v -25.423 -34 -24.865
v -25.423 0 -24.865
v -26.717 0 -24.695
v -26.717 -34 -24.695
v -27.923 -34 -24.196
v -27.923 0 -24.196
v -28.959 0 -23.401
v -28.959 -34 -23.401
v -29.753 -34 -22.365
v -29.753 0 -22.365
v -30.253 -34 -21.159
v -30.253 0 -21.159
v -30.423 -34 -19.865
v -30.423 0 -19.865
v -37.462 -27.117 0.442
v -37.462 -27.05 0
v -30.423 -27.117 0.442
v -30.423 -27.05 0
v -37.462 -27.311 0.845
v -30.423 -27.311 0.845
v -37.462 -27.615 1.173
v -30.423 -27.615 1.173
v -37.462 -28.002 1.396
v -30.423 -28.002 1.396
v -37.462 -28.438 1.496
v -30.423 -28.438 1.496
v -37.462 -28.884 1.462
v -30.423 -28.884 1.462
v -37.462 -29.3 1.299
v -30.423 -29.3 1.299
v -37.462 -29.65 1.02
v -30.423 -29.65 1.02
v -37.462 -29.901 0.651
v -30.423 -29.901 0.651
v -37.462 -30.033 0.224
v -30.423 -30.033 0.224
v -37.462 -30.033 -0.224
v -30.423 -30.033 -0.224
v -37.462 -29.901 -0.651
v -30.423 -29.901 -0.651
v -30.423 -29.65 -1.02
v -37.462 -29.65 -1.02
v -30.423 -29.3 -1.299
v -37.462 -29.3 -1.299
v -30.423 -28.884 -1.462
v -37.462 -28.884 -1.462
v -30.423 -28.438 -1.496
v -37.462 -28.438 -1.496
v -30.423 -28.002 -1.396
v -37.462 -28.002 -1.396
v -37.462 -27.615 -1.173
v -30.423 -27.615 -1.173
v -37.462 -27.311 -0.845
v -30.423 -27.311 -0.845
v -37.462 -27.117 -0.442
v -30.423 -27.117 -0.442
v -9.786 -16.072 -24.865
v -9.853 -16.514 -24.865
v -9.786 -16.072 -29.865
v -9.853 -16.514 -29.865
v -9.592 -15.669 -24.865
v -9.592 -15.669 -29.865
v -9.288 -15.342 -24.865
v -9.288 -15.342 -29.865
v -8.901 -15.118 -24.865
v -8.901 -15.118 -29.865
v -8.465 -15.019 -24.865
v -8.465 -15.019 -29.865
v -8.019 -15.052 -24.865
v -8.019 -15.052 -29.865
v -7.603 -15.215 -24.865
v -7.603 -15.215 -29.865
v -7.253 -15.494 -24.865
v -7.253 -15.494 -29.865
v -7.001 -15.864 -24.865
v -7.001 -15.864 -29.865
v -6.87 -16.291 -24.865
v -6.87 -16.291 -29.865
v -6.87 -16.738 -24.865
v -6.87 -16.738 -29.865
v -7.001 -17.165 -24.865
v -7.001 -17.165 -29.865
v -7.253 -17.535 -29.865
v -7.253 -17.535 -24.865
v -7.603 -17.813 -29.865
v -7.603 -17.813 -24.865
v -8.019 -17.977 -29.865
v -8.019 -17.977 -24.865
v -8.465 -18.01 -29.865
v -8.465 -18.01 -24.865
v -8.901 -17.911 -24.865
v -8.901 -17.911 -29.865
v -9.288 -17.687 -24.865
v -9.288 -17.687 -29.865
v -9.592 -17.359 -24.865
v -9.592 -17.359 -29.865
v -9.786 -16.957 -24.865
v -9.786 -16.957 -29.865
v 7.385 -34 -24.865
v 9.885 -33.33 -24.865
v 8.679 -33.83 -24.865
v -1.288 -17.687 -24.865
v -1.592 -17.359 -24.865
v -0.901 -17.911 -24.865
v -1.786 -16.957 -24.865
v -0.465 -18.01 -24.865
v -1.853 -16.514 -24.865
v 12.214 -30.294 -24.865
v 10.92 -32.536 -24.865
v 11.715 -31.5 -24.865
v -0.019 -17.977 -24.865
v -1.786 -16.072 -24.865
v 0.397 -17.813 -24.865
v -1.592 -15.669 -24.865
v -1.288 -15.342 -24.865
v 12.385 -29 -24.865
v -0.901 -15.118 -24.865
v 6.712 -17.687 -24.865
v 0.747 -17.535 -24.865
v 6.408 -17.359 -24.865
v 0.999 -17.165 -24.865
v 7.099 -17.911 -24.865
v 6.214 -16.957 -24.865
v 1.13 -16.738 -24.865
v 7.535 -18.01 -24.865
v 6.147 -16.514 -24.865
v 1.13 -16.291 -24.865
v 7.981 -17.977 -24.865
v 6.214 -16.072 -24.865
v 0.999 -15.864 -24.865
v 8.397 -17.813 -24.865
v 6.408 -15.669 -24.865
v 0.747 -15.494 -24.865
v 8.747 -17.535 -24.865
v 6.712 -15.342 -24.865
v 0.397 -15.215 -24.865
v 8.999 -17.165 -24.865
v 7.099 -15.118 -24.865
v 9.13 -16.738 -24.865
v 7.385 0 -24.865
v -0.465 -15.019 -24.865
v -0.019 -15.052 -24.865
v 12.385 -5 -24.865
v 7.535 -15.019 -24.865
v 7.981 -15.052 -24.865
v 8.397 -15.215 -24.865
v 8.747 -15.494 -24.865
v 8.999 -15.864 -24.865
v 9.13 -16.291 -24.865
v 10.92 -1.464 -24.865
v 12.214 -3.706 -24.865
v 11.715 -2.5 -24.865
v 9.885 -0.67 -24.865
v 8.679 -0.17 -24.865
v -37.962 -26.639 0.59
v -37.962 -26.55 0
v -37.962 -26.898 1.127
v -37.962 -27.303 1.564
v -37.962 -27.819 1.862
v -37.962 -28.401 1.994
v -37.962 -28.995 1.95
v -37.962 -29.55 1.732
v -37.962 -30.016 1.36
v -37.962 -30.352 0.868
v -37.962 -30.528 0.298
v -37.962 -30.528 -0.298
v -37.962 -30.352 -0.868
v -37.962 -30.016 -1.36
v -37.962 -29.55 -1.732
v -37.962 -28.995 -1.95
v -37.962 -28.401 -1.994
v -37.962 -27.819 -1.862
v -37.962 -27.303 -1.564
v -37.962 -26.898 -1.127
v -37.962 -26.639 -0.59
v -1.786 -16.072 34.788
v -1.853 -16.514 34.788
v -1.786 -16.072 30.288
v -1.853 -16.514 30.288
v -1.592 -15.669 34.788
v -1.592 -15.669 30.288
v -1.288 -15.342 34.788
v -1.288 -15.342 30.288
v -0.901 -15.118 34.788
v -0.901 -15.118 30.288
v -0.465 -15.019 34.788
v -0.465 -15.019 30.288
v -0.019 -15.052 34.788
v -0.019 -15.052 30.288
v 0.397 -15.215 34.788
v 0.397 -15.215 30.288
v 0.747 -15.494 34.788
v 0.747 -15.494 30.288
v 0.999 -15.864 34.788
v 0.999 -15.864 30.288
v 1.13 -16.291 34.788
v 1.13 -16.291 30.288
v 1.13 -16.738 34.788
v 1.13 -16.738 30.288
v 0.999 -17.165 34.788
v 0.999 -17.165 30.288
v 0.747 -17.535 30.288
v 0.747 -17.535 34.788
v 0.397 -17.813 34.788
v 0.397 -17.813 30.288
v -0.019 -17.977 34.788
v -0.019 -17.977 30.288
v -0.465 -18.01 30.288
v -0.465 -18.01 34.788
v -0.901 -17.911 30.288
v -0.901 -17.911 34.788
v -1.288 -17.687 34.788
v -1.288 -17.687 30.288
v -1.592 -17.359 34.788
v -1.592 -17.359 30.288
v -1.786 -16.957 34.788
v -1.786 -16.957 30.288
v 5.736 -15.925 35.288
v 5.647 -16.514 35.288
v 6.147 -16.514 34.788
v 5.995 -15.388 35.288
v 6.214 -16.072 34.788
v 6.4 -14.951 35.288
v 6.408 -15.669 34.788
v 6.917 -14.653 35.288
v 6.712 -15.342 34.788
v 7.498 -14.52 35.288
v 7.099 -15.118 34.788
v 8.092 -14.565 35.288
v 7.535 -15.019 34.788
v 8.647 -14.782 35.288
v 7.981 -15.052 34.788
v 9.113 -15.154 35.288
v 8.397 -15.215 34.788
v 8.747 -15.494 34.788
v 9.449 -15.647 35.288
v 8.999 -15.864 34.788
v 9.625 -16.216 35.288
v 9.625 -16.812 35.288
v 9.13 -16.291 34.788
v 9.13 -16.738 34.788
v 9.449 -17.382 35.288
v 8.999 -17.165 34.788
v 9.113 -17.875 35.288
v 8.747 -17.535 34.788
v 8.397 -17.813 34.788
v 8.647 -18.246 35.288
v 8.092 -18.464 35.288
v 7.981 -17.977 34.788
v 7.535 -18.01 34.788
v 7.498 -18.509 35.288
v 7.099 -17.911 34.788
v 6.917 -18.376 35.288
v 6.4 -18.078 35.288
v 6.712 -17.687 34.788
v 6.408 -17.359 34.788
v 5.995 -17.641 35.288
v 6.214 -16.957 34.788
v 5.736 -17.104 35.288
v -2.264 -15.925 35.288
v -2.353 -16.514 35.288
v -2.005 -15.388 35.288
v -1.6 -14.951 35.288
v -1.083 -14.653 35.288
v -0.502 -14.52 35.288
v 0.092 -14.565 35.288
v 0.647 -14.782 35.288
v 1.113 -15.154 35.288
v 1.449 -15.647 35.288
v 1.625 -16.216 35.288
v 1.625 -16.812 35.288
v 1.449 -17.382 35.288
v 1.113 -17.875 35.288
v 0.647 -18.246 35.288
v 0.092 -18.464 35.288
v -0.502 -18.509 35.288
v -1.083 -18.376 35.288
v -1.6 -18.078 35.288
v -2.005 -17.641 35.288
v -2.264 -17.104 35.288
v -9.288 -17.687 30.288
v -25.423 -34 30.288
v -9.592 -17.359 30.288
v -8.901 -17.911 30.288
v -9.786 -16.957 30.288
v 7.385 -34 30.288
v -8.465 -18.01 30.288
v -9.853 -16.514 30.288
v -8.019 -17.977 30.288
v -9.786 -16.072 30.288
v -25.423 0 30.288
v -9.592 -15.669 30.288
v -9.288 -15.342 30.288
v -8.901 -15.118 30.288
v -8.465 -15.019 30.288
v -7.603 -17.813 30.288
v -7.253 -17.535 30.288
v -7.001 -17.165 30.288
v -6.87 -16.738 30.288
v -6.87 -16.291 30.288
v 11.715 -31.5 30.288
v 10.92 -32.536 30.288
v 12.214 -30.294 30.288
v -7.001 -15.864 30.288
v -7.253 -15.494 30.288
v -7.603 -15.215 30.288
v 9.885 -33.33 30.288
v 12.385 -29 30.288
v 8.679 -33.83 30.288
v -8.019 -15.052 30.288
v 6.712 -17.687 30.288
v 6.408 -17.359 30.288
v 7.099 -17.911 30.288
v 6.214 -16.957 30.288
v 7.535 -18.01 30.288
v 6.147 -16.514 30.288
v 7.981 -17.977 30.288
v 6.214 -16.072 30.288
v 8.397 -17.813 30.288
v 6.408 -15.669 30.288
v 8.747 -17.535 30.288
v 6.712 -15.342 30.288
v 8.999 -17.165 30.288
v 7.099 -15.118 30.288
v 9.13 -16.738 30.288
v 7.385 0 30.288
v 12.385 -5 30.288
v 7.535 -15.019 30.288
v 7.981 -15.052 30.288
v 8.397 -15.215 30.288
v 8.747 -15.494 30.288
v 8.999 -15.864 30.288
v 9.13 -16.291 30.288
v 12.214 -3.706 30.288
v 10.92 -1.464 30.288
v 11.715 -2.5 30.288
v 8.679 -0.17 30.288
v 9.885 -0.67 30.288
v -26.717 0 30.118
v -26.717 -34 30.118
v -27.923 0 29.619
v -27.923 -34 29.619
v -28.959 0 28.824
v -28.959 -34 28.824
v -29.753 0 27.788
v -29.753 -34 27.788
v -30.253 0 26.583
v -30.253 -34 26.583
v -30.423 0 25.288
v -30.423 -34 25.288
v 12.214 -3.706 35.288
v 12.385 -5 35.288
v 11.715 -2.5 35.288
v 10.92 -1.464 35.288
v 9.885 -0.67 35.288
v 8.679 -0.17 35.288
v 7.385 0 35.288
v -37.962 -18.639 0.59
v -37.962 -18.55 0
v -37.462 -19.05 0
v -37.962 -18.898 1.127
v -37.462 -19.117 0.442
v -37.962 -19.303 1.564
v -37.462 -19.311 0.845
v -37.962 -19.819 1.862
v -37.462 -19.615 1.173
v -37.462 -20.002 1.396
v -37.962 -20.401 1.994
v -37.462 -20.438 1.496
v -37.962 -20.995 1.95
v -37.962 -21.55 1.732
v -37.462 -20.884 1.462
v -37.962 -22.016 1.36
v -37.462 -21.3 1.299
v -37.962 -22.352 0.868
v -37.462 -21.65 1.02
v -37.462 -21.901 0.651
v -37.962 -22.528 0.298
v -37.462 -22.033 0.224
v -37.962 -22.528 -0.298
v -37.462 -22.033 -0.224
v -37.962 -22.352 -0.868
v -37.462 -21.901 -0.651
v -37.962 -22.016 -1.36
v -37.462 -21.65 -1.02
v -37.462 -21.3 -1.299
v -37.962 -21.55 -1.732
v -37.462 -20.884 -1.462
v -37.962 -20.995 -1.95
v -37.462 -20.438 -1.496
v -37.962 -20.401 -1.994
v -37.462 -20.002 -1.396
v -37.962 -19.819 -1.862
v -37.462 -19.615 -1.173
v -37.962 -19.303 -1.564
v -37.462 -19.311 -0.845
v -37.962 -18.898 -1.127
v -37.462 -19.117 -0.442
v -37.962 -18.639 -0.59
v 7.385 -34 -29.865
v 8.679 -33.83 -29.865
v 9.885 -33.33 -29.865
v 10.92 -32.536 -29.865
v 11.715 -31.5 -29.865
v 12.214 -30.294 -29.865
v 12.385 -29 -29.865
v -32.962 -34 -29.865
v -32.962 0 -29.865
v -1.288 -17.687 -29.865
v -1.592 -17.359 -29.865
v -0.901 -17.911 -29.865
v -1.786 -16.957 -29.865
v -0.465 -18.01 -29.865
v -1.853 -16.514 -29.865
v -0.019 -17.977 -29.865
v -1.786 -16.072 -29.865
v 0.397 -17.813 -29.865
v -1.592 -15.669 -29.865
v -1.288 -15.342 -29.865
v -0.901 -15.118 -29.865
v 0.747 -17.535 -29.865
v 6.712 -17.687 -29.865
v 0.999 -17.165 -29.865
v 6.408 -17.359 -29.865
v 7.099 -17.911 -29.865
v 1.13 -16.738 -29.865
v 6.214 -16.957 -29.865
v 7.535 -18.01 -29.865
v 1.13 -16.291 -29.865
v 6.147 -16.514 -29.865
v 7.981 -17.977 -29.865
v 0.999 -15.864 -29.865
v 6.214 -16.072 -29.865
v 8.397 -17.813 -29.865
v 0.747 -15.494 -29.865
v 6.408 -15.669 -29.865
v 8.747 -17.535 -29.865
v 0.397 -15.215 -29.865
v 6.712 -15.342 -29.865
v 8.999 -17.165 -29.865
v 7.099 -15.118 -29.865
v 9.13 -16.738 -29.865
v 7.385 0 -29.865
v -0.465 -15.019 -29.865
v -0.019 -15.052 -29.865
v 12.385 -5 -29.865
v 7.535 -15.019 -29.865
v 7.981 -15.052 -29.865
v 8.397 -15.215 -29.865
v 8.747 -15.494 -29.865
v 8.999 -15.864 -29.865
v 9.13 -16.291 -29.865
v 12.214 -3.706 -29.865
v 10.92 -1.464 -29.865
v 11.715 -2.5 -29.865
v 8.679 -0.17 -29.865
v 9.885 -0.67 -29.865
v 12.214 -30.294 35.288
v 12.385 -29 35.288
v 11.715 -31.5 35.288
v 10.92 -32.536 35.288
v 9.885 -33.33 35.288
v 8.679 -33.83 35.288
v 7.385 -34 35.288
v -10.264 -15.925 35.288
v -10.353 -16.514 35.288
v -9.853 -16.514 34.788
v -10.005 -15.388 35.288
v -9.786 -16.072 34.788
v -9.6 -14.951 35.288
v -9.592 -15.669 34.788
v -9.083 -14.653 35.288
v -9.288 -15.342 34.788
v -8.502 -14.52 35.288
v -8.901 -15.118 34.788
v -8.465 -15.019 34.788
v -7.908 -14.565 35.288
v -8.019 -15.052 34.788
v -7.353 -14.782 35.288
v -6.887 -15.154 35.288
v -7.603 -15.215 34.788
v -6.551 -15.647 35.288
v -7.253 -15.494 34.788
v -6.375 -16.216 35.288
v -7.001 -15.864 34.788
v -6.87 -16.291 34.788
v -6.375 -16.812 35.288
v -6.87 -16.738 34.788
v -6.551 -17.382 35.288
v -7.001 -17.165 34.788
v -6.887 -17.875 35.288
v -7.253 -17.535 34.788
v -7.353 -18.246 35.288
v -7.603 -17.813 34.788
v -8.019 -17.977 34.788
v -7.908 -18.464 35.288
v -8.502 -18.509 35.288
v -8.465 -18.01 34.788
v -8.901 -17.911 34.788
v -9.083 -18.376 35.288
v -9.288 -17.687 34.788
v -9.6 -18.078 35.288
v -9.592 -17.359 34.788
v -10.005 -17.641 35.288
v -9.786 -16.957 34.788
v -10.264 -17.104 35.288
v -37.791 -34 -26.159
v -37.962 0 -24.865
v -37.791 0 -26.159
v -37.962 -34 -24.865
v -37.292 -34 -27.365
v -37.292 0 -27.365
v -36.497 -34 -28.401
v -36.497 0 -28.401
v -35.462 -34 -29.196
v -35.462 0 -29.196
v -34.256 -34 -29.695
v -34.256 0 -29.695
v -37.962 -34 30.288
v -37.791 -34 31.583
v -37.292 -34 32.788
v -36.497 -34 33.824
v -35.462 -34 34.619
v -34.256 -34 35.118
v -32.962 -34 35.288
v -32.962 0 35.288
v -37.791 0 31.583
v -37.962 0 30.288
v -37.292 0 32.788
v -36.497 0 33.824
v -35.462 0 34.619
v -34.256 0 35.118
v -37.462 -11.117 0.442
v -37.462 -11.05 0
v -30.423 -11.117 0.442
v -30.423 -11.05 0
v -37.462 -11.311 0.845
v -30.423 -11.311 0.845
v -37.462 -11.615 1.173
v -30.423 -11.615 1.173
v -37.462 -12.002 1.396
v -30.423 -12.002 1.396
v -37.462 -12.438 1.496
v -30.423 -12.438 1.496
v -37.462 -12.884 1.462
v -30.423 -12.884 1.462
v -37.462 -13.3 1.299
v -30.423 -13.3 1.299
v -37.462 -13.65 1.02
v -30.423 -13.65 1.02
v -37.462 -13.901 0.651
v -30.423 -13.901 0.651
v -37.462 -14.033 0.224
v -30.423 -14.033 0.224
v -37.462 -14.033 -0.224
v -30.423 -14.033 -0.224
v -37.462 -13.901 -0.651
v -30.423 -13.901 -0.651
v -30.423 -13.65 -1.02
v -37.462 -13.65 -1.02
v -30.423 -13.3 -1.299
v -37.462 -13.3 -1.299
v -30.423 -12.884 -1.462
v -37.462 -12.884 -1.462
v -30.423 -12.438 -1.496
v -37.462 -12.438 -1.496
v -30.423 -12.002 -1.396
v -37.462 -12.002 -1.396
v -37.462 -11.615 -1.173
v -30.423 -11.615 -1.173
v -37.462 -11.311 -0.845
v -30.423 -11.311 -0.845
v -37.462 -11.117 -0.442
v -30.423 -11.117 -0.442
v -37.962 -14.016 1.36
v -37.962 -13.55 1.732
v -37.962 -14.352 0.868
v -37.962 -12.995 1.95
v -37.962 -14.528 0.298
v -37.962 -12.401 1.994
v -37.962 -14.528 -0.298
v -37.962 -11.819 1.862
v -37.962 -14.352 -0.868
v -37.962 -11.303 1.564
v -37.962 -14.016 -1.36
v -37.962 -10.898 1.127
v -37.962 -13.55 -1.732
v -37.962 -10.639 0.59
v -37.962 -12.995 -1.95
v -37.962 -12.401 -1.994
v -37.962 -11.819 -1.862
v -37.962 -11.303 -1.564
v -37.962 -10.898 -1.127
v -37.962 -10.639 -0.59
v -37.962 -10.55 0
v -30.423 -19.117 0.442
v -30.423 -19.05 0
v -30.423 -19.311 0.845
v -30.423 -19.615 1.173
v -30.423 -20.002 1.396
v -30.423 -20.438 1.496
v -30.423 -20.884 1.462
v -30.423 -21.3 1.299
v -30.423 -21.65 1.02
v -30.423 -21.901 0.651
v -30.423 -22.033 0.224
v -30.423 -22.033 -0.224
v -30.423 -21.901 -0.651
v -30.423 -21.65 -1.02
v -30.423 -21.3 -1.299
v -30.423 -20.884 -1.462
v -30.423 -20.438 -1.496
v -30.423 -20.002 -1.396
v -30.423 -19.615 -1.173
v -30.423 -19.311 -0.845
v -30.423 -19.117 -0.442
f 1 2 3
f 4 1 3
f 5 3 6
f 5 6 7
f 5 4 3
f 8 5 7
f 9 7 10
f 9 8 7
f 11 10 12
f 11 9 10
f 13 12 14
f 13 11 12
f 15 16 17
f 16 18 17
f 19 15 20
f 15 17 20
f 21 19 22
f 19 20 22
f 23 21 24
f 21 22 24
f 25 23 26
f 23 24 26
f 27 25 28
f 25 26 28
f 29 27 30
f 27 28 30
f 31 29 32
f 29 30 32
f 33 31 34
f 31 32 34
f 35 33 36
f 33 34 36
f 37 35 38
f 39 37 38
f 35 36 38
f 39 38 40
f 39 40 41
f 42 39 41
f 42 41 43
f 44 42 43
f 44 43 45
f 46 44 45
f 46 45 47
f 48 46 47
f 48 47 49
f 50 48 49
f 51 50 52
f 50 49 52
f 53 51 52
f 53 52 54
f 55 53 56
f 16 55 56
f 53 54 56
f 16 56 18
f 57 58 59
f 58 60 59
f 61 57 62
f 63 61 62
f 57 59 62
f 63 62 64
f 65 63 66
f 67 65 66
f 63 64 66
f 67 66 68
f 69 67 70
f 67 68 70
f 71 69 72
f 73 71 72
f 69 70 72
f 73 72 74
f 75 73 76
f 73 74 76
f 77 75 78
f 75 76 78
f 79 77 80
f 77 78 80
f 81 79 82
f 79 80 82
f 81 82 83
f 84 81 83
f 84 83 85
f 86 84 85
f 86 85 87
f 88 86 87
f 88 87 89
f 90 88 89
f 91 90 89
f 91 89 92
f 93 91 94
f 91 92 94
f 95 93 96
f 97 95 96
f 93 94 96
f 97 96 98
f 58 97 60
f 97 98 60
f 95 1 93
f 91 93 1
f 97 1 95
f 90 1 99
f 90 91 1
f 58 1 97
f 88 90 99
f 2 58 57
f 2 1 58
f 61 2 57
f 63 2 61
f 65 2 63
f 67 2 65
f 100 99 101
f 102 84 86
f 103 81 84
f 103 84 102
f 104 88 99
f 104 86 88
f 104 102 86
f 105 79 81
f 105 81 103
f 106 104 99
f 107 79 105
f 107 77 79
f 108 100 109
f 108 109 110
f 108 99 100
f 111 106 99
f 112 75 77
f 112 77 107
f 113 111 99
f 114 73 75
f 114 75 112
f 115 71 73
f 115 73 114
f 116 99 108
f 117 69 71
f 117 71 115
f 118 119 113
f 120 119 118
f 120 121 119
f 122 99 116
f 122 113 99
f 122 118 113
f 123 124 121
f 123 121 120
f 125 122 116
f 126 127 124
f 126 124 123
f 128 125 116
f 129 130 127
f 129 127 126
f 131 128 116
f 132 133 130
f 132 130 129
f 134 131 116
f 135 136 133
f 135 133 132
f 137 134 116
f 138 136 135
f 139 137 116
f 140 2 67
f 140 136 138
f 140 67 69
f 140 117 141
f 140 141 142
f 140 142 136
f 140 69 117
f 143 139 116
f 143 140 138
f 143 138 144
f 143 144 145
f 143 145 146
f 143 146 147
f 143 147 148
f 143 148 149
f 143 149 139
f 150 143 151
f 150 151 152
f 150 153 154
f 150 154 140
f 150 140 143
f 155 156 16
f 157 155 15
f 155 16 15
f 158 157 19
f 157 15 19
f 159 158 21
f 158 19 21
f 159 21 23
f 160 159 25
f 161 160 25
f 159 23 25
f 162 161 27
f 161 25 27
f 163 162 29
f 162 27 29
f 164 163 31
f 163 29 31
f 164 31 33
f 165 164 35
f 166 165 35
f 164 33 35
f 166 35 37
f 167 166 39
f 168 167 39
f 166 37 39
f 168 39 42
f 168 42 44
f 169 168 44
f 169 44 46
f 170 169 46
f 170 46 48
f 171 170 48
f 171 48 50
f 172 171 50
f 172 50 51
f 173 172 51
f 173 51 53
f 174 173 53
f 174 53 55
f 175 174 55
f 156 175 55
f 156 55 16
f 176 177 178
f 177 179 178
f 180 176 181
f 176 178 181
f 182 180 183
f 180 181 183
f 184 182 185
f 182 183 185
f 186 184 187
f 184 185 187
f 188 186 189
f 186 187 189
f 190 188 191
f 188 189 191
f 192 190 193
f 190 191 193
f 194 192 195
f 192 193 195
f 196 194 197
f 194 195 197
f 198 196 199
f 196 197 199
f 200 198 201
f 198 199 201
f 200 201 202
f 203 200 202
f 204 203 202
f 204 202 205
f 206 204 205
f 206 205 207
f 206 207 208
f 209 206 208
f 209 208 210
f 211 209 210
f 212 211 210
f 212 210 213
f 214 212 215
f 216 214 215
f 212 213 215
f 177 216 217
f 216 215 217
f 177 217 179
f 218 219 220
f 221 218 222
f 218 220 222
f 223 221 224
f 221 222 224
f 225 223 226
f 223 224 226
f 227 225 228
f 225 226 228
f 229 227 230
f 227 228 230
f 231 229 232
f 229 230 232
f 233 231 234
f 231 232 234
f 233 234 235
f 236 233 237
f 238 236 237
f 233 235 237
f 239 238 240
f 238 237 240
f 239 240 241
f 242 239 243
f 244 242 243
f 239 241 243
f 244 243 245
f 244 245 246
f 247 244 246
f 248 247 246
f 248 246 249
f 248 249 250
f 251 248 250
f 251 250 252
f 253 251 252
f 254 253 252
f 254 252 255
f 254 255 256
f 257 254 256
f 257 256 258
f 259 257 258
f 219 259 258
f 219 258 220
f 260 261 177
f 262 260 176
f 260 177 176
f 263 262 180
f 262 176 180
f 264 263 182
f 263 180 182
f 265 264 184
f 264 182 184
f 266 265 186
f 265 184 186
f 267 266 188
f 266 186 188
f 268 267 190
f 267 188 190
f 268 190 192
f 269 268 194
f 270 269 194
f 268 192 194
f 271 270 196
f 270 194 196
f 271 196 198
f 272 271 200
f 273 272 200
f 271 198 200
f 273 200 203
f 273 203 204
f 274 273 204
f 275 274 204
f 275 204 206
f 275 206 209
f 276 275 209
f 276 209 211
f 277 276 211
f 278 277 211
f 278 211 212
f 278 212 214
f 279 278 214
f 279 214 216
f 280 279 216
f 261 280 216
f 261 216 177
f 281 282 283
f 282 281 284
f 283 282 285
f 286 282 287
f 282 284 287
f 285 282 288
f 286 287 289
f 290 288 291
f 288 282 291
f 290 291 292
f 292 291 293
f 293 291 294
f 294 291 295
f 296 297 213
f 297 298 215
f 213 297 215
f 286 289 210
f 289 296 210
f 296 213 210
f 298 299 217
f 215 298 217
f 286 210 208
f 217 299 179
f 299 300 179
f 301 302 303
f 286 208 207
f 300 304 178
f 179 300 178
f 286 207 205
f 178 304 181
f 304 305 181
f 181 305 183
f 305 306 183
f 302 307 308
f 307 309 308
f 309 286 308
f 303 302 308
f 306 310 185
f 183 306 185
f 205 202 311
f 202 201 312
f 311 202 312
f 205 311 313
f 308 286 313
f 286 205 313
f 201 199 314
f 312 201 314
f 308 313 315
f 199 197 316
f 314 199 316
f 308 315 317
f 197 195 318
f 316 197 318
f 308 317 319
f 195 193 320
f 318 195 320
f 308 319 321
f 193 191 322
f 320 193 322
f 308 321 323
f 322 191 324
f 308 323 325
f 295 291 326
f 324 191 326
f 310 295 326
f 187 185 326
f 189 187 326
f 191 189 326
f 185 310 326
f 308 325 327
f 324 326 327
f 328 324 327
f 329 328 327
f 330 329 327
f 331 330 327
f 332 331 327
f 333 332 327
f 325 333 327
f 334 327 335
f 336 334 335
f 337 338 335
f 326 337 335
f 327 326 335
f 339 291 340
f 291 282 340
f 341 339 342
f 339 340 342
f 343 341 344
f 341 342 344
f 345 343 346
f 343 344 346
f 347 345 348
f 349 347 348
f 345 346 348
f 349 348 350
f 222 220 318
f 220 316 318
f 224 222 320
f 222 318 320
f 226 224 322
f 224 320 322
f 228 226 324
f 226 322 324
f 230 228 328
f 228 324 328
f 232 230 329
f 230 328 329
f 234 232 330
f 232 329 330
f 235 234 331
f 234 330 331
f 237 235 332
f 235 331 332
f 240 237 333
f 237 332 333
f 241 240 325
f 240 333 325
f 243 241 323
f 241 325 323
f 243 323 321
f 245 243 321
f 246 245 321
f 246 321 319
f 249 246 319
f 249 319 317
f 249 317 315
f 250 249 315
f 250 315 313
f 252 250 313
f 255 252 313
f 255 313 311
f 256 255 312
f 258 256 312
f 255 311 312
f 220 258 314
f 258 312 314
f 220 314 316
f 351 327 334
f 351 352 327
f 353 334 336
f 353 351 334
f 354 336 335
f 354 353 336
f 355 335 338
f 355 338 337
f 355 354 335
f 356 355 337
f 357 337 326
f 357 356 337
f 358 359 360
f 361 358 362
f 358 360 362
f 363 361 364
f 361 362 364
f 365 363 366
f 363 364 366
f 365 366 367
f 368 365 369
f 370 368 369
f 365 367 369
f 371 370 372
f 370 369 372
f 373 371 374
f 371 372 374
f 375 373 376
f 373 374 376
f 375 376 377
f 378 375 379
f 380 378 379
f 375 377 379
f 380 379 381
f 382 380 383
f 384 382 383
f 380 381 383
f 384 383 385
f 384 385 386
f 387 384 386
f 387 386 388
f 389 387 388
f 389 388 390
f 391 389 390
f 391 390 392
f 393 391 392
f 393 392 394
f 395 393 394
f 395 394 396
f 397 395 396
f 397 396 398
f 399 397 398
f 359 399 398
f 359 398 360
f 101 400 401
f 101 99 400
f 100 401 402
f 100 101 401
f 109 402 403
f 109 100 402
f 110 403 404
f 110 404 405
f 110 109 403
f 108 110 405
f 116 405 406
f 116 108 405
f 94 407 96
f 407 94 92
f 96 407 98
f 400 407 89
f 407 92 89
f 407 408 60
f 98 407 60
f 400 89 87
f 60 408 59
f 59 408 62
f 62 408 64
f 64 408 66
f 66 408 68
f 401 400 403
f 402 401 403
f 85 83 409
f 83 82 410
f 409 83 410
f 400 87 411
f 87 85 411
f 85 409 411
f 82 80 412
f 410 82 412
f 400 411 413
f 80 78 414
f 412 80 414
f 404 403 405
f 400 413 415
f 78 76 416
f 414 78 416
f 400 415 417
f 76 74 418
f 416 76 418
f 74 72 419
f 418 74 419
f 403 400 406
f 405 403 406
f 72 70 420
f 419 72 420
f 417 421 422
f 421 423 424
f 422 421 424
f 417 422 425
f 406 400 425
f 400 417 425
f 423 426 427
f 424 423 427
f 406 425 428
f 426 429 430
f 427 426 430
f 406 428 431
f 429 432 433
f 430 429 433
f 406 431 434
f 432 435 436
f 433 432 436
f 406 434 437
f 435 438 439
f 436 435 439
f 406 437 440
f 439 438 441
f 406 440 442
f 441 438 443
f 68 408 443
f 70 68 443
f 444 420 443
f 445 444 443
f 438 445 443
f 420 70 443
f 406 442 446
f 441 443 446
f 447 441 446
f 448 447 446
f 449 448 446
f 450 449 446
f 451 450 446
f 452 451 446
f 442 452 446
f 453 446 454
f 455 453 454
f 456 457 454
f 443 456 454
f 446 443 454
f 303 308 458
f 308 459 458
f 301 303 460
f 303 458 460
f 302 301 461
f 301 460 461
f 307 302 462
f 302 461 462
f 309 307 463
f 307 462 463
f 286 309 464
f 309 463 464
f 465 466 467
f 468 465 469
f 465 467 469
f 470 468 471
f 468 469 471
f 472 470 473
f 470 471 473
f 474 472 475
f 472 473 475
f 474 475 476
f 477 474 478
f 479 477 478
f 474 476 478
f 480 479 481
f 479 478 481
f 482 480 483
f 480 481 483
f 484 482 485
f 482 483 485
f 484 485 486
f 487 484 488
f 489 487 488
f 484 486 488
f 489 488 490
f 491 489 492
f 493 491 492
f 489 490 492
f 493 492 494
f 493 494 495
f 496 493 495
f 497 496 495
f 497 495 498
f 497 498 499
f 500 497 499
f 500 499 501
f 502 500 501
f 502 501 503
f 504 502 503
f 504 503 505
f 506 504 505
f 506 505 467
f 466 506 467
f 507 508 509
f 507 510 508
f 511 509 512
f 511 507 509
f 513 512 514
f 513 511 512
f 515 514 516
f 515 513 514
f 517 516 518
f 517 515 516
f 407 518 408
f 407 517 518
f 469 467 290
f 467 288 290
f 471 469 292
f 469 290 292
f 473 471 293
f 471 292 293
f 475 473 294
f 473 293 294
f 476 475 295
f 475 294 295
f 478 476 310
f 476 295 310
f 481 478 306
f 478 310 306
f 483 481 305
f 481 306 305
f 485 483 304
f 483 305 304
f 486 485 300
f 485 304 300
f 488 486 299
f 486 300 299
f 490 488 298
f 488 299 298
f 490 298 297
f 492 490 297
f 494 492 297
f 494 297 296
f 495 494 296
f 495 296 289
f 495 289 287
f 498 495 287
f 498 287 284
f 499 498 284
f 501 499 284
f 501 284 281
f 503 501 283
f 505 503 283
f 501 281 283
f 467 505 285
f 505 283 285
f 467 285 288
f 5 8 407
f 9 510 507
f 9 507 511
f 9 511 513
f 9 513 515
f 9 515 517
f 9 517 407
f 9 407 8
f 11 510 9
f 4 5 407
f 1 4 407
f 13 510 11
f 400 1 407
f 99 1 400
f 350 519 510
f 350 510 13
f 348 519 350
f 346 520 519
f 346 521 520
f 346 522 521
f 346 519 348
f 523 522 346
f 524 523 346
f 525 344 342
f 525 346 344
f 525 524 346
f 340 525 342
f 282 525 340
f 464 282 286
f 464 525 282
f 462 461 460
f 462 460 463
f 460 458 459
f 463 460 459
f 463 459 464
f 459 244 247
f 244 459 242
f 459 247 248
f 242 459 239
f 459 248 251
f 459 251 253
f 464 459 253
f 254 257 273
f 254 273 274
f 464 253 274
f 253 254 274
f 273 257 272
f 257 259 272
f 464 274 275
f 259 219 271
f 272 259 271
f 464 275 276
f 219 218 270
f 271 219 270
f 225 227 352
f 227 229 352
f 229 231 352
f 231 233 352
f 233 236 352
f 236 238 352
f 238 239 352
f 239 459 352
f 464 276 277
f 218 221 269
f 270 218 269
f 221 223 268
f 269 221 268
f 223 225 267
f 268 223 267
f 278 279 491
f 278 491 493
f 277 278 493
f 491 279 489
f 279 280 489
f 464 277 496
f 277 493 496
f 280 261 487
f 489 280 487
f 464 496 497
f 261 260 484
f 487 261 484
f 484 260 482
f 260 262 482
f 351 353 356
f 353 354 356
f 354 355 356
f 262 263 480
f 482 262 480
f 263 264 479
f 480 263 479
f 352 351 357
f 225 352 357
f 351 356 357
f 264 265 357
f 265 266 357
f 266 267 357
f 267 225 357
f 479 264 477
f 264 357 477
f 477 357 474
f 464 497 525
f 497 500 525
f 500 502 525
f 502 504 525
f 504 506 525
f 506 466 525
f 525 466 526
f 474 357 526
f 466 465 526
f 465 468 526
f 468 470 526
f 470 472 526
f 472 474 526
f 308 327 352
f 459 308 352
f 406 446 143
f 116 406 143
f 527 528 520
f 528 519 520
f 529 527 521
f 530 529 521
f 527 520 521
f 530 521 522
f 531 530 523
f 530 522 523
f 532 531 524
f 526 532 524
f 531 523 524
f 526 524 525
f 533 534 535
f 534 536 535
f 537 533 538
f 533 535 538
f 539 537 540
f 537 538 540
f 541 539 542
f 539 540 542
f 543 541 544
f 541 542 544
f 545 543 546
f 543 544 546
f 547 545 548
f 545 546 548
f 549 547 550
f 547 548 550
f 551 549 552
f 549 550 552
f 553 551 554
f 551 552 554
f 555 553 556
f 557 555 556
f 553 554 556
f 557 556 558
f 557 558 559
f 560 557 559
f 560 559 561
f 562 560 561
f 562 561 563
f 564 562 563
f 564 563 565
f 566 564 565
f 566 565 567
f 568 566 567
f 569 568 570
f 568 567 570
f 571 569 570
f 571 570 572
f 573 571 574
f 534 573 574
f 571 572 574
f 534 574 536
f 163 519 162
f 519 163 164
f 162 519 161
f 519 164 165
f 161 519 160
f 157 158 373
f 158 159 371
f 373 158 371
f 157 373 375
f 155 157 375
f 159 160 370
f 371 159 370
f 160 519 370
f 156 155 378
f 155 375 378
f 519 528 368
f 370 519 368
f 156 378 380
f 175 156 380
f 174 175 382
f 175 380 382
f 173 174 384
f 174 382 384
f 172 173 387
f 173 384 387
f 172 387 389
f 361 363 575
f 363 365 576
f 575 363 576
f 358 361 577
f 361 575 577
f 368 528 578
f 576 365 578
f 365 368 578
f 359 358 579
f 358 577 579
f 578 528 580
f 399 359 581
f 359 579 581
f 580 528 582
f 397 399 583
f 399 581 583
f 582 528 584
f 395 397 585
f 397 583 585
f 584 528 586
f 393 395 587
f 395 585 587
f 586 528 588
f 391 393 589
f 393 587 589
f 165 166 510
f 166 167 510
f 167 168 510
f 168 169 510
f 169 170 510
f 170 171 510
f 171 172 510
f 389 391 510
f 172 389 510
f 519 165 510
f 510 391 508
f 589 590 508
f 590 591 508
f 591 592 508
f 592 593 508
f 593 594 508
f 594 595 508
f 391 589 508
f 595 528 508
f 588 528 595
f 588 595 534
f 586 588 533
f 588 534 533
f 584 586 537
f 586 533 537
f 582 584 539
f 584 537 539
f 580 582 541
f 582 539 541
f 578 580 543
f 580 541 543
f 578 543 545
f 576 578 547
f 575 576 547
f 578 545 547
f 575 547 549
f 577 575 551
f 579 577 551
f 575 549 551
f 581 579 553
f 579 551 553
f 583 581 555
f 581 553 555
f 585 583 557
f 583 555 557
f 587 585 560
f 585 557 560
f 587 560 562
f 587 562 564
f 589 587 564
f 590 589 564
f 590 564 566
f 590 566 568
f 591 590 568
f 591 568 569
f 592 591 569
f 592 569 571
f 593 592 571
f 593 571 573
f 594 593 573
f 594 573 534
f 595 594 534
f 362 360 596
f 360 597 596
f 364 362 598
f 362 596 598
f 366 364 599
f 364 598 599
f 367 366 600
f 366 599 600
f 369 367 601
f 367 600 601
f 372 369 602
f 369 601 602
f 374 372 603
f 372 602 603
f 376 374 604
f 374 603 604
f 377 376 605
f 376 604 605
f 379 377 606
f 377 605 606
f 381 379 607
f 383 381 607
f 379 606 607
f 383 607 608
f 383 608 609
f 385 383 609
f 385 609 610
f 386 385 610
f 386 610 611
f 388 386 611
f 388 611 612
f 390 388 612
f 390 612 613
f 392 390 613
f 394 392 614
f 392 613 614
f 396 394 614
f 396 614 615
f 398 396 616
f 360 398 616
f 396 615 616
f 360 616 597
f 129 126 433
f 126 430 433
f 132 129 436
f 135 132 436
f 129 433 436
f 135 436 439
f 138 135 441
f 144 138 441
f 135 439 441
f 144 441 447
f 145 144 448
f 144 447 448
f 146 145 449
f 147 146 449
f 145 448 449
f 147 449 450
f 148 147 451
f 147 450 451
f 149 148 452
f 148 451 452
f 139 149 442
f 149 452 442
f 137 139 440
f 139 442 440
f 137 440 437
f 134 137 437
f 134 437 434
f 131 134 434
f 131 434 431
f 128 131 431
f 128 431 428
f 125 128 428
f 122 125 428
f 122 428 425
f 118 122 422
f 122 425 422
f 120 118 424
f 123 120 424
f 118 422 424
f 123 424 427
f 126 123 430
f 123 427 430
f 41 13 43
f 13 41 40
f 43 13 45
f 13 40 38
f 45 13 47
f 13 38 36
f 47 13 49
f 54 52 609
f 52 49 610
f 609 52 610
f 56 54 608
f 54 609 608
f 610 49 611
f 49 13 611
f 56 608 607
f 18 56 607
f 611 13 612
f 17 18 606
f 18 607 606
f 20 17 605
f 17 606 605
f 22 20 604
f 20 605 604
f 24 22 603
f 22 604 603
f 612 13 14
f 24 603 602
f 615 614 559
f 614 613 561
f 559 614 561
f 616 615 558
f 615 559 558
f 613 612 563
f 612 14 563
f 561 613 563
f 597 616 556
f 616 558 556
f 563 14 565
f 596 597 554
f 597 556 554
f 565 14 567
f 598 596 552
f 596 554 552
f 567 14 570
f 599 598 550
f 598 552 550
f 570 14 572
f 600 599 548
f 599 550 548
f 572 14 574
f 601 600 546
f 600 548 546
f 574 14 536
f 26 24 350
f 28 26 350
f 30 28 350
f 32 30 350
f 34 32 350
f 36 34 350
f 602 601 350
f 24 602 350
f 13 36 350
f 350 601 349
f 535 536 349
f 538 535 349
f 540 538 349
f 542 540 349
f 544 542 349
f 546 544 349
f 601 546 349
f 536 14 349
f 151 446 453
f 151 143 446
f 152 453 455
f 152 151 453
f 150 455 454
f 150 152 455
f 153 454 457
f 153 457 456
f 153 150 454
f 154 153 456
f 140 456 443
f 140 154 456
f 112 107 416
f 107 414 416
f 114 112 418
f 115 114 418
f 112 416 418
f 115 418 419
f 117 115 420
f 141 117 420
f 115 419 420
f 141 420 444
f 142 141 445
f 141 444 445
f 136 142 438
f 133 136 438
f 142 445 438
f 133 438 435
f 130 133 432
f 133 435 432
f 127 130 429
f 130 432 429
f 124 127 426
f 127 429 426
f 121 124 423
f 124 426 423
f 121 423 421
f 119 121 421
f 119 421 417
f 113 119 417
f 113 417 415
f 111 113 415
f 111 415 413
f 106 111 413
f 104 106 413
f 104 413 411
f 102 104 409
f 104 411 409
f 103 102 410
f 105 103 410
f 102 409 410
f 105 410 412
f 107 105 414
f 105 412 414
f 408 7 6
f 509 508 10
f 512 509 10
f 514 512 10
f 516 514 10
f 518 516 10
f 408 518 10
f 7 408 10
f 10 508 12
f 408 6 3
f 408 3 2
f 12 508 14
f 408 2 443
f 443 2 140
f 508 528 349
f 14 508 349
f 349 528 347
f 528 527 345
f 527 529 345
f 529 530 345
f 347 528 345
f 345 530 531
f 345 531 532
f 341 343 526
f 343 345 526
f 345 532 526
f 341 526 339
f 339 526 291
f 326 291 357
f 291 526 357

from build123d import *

# Parameters (mm, degrees)
F0_W            = 42.8076982498
F0_H            = 5
F1_DEPTH        = 34
F2_R            = 5
F3_R            = 5
F4_R            = 5
F5_R            = 5
F6_R            = 5
F7_R            = 5
F10_D           = 3
F10_CSINK_D     = 4
F10_CSINK_ANGLE = 90
F11_D           = 3
F11_CSINK_D     = 4
F11_CSINK_ANGLE = 90


with BuildPart() as f1:
    # F0 (on Front) → F1 (new body)
    with BuildSketch(Plane.XZ):
        Polygon((-30.423078686, 35.2884634584), (-37.9615426064, 35.2884634584), (-37.9615426064, -29.8653867841), (-30.423078686, -29.8653867841), (-30.423078686, -24.8653867841), (-30.423078686, 30.2884634584), align=None)
        with Locations((-9.0192295611, 32.7884634584)):
            Rectangle(F0_W, F0_H)
        with Locations((-9.0192295611, -27.3653867841)):
            Rectangle(F0_W, F0_H)
    extrude(amount=F1_DEPTH)

    # F2
    f2_edges = [f1.edges().sort_by_distance(p)[0] for p in [
        (12.38462, -34, 32.788463),
    ]]
    fillet(f2_edges, radius=F2_R)

    # F3
    f3_edges = [f1.edges().sort_by_distance(p)[0] for p in [
        (12.38462, 0, 32.788463),
    ]]
    fillet(f3_edges, radius=F3_R)

    # F4
    f4_edges = [f1.edges().sort_by_distance(p)[0] for p in [
        (12.38462, -34, -27.365387),
    ]]
    fillet(f4_edges, radius=F4_R)

    # F5
    f5_edges = [f1.edges().sort_by_distance(p)[0] for p in [
        (12.38462, 0, -27.365387),
    ]]
    fillet(f5_edges, radius=F5_R)

    # F6
    f6_edges = [f1.edges().sort_by_distance(p)[0] for p in [
        (-37.961543, -17, 35.288463),
    ]]
    fillet(f6_edges, radius=F6_R)

    # F7
    f7_edges = [f1.edges().sort_by_distance(p)[0] for p in [
        (-30.423079, -17, -24.865387),
        (-30.423079, -17, 30.288463),
        (-37.961543, -17, -29.865387),
    ]]
    fillet(f7_edges, radius=F7_R)

    # F10 (through all)
    with Locations(Plane(origin=(-37.9615426064, 0, 0), x_dir=(0, -1, 0), z_dir=(-1, 0, 0))):
        with Locations((12.5500056893, 0), (20.5500056893, 0), (28.5500056893, 0)):
            CounterSinkHole(F10_D / 2, F10_CSINK_D / 2, counter_sink_angle=F10_CSINK_ANGLE)

    # F11 (through all)
    with Locations(Plane.XY.offset(35.2884634584)):
        with Locations((-0.3527658135, -16.5143854618), (-8.3527658135, -16.5143854618), (7.6472341865, -16.5143854618)):
            CounterSinkHole(F11_D / 2, F11_CSINK_D / 2, counter_sink_angle=F11_CSINK_ANGLE)


solid = f1.part
